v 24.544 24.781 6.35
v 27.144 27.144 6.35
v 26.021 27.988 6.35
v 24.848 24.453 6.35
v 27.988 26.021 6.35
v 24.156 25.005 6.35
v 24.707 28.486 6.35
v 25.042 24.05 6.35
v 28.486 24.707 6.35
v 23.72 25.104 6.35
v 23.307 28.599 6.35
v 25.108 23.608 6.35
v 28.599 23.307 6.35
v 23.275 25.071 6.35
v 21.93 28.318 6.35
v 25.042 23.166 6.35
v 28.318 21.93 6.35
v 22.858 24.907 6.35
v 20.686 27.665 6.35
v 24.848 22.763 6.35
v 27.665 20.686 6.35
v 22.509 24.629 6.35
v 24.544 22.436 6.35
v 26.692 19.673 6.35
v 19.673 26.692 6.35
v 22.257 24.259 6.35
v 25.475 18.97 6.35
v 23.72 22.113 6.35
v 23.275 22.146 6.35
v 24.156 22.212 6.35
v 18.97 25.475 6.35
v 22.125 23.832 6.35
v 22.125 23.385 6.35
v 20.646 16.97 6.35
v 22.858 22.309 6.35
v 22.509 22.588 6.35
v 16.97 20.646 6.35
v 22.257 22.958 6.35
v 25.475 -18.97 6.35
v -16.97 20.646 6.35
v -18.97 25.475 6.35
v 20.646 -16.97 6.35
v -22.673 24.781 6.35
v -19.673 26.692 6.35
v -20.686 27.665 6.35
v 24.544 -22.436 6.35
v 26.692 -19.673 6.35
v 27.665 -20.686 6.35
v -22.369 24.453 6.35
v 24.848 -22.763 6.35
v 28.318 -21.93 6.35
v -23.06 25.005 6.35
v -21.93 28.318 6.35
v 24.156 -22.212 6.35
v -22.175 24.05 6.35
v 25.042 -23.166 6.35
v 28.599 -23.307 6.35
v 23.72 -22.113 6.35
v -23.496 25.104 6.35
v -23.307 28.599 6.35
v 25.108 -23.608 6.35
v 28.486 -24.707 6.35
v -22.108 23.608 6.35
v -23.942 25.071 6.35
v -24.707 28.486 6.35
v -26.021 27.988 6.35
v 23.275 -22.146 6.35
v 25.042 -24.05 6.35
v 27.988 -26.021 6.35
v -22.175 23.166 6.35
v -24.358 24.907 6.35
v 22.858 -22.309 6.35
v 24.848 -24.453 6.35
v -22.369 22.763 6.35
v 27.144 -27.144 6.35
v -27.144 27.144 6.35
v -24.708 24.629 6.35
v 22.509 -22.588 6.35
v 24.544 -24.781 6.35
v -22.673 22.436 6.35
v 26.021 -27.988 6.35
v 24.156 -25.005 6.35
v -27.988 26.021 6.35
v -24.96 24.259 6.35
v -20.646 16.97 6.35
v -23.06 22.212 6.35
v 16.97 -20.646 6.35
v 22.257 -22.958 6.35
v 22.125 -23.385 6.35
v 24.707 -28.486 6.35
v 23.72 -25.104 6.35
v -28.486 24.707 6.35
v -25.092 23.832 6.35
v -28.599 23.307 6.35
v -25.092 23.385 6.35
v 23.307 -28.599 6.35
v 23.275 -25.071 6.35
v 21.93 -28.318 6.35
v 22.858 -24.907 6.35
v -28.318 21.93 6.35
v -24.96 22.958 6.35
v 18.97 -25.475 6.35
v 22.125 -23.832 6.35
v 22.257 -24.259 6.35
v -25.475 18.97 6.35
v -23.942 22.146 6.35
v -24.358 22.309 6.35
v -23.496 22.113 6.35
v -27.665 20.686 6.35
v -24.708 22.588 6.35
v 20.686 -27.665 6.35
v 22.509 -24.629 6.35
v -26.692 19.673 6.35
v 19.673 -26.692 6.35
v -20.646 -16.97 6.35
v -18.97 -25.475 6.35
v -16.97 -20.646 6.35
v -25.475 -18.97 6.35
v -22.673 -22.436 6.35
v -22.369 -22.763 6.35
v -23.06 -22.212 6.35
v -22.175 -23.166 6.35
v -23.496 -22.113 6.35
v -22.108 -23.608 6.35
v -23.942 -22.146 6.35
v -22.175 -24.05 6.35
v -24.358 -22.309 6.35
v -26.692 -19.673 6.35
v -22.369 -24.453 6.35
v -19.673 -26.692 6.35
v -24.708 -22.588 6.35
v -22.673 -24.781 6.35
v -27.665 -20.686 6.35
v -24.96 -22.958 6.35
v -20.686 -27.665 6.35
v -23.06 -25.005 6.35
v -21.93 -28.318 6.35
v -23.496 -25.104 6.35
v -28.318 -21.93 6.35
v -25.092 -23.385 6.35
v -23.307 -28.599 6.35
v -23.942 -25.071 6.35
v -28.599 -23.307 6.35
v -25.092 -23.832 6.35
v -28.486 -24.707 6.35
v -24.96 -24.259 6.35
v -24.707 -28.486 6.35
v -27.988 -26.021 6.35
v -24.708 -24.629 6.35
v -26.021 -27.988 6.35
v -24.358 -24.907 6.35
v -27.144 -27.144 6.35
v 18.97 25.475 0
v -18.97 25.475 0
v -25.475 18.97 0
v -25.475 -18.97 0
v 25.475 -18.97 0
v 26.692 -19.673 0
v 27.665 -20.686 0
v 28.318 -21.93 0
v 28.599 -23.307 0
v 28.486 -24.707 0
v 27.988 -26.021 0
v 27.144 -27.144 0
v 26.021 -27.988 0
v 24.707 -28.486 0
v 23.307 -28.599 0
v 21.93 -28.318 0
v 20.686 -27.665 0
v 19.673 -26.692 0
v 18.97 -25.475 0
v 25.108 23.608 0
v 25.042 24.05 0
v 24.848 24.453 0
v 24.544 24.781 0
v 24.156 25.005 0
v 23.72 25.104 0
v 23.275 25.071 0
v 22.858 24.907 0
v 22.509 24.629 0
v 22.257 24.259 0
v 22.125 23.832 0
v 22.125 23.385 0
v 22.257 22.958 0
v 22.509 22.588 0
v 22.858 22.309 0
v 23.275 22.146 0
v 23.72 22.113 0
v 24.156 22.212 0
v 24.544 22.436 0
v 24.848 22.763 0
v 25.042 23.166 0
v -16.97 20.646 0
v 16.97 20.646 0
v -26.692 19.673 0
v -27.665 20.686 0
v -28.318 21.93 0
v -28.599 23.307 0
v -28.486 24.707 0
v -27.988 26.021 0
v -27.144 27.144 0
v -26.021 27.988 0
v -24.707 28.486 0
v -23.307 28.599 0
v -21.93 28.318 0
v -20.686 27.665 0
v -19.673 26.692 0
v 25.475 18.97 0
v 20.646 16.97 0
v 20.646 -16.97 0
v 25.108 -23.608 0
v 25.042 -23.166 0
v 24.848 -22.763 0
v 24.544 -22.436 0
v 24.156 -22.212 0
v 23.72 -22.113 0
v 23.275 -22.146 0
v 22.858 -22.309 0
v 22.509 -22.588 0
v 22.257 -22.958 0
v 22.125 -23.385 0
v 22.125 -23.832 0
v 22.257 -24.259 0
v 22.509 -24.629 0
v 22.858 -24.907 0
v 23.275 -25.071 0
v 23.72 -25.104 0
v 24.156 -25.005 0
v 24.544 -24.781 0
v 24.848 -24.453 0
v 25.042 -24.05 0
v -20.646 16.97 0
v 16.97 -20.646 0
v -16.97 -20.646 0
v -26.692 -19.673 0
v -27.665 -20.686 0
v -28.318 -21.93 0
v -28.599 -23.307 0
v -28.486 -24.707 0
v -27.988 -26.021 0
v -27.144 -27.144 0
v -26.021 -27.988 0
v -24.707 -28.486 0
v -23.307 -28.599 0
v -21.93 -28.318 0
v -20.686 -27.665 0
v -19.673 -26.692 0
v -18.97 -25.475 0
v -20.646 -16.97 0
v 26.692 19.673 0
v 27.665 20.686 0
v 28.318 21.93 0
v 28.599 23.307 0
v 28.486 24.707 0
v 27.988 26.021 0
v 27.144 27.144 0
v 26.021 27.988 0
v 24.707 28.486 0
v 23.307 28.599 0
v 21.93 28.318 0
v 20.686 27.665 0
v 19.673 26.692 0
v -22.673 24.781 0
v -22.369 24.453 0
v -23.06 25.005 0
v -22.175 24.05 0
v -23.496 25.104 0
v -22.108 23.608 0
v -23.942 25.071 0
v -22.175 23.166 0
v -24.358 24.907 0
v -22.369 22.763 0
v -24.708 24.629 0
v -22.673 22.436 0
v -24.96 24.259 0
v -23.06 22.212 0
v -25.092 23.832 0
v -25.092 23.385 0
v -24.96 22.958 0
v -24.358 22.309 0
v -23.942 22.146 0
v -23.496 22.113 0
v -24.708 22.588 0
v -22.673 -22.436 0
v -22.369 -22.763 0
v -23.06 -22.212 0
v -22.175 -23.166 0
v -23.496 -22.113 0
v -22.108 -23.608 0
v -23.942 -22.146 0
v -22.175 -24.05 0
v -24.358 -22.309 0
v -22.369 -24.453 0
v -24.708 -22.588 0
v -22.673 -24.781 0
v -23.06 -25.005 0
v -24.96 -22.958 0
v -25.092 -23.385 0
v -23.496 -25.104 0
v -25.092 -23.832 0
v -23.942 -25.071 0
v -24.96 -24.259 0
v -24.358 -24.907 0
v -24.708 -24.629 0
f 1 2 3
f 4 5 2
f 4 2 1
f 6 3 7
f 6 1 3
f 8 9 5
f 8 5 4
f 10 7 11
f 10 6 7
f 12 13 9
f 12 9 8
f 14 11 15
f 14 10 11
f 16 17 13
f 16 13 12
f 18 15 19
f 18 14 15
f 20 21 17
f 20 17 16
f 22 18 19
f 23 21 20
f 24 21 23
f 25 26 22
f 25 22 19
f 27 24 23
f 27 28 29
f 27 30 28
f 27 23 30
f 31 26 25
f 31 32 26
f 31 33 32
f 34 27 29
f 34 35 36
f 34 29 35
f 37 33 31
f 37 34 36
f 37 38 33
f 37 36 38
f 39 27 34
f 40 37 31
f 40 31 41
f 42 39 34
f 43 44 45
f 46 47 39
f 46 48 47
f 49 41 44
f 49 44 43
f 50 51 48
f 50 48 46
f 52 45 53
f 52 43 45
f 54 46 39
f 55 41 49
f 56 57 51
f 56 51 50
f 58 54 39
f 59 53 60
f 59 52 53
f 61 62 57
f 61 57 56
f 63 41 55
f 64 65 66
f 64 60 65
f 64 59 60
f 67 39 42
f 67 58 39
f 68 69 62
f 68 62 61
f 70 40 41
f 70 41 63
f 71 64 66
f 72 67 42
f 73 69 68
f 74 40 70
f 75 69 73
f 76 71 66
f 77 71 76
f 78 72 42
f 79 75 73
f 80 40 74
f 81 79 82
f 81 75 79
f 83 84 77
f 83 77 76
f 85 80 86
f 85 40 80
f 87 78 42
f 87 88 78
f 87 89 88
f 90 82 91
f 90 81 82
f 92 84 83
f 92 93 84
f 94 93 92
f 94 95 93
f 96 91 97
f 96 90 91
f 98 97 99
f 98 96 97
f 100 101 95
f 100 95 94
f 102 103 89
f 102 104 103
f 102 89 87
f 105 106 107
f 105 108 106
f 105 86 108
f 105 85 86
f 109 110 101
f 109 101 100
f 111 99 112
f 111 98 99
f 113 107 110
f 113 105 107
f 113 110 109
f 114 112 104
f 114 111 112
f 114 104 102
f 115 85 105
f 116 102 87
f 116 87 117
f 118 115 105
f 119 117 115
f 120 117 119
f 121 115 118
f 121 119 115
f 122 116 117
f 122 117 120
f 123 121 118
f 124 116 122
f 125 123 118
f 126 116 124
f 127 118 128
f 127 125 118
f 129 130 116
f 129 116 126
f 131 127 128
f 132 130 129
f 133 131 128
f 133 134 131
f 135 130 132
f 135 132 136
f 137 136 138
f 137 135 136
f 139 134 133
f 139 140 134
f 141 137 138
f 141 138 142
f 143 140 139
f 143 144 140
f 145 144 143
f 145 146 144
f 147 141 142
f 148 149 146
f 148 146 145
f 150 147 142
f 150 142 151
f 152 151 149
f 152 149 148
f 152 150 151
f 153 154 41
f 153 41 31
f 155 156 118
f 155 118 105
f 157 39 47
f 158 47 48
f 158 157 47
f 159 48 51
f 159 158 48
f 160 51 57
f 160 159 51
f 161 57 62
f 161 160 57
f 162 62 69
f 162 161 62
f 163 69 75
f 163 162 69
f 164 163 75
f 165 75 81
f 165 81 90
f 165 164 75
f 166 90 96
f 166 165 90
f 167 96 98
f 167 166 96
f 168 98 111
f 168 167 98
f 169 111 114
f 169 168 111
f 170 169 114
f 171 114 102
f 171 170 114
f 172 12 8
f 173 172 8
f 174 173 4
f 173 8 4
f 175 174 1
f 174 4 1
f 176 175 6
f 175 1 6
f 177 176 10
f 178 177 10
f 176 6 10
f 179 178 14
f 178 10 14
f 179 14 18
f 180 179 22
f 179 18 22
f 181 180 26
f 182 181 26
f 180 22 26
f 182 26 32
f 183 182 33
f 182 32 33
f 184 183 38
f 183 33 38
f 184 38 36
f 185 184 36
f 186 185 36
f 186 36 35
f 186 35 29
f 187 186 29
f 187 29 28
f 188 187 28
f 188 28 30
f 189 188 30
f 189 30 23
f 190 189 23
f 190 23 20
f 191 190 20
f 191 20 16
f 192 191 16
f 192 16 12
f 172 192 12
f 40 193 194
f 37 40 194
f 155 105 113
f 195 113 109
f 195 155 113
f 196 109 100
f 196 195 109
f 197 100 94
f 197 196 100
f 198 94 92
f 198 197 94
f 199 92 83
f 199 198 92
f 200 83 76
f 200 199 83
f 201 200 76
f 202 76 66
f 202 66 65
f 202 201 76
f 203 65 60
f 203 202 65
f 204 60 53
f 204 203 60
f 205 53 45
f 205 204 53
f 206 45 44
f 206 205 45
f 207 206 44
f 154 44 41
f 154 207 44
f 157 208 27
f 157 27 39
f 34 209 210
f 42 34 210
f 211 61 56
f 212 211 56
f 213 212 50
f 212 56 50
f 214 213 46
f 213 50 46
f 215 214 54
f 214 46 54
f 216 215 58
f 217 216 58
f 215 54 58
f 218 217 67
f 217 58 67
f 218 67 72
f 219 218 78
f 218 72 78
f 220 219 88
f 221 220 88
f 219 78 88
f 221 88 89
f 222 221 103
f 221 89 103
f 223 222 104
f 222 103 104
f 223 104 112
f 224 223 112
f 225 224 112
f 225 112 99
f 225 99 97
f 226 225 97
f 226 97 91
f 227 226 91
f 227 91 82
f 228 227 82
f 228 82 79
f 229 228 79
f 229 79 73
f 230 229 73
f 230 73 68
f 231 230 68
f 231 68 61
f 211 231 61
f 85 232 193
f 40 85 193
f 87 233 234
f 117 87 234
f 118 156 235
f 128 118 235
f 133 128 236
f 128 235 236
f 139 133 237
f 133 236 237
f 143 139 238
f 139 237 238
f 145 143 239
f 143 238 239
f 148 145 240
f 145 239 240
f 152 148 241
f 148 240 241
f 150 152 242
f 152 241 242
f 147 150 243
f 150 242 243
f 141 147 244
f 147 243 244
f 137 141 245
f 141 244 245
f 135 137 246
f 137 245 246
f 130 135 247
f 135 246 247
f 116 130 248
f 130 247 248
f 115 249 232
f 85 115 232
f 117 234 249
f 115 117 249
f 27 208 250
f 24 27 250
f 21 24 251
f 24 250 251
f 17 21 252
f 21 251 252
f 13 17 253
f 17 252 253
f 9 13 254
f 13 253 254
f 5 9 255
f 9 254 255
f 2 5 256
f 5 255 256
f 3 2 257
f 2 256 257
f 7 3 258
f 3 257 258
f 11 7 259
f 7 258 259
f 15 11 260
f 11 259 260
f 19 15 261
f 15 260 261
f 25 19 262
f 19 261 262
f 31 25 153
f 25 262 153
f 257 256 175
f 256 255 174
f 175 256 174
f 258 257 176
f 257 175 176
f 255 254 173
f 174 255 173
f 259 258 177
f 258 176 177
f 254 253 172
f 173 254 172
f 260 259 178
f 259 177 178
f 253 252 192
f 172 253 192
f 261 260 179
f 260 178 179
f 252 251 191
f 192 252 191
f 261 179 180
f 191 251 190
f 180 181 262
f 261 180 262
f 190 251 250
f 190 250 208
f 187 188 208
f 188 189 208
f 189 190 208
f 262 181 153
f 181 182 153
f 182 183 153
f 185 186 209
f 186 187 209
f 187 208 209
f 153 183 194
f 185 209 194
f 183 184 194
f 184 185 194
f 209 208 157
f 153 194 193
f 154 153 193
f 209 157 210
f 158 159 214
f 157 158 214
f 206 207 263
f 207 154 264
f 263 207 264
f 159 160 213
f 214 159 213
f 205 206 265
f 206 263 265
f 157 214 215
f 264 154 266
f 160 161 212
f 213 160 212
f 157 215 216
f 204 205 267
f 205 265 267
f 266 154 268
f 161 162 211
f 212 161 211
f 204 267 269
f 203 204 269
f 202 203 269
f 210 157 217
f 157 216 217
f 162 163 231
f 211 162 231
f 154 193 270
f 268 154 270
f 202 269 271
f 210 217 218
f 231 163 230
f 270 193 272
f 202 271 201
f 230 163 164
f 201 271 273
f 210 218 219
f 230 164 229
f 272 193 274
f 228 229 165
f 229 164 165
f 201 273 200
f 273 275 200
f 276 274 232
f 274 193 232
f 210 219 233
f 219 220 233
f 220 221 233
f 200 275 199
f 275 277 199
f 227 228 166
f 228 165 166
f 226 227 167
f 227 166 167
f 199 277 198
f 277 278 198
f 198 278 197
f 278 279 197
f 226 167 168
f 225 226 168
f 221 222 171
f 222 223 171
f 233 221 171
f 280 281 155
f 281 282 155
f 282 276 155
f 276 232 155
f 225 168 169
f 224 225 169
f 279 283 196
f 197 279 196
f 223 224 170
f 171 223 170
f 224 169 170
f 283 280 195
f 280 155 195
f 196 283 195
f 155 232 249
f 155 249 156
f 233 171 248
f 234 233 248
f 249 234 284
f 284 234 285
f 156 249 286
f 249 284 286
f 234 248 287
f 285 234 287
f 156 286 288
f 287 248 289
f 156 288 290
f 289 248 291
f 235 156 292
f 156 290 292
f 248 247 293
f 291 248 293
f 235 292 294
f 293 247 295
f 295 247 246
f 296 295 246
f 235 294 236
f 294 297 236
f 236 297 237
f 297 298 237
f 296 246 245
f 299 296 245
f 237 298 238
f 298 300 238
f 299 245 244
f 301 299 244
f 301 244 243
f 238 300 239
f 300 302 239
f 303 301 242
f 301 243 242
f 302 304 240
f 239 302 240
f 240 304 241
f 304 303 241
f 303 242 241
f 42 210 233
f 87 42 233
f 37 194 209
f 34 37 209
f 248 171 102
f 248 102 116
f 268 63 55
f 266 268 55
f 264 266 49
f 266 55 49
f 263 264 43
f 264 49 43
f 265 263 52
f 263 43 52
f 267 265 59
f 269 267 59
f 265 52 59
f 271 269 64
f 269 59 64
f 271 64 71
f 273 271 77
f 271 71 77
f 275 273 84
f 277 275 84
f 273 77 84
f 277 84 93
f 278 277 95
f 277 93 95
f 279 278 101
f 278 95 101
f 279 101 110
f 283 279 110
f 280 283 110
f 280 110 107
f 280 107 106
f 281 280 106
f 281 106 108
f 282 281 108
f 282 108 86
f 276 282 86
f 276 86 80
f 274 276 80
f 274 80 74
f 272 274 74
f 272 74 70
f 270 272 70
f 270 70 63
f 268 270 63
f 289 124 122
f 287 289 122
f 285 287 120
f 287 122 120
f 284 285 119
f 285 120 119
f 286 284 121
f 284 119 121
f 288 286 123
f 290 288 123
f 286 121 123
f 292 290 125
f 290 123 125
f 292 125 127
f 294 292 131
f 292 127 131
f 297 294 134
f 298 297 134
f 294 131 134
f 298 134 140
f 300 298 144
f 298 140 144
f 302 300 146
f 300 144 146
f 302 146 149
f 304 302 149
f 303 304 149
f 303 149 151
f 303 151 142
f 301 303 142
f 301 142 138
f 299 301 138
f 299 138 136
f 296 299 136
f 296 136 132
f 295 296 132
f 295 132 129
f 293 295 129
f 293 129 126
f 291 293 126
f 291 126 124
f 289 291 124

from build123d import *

# Parameters (mm, degrees)
BOSS_EXTRU_2_DEPTH        = 6.35
ESQUISSE29_R              = 5
BOSS_EXTRU_3_DEPTH        = 6.35
SYM_TRIE2_COPY_1_SKETCH_R = 5
SYM_TRIE2_COPY_1_DEPTH    = 6.35
ESQUISSE30_R              = 1.5
ENL_V_MAT_EXTRU_1_DEPTH   = 41.953581056


with BuildPart() as part:
    # Esquisse28 → Boss.-Extru.2 (new body)
    with BuildSketch(Plane.XY):
        Polygon((-18.97, -25.475382387), (-25.475382387, -18.97), (-25.475382387, 18.97), (-18.97, 25.475382387), (18.97, 25.475382387), (25.475382387, 18.97), (25.475382387, -18.97), (18.97, -25.475382387), align=None)
        Polygon((-16.97, -20.645541049), (-20.645541049, -16.97), (-20.645541049, 16.97), (-16.97, 20.645541049), (16.97, 20.645541049), (20.645541049, 16.97), (20.645541049, -16.97), (16.97, -20.645541049), align=None, mode=Mode.SUBTRACT)
    extrude(amount=BOSS_EXTRU_2_DEPTH)

    # Esquisse29 → Boss.-Extru.3 (add)
    with BuildSketch(Plane.XY):
        with Locations((23.60833184, 23.60833184)):
            Circle(ESQUISSE29_R)
    boss_extru_3 = extrude(amount=BOSS_EXTRU_3_DEPTH)

    # Symétrie1: Boss.-Extru.3 across plane
    add(boss_extru_3.mirror(Plane(origin=(0, 0, 0), x_dir=(0, 0, 1), z_dir=(1, 0, 0))))

    # Symétrie2: Boss.-Extru.3 across plane
    add(boss_extru_3.mirror(Plane.ZX))

    # Symétrie2 copy 1 sketch → Symétrie2 copy 1 (add)
    with BuildSketch(Plane(origin=(0, 0, 0), x_dir=(-1, 0, 0), z_dir=(0, 0, 1))):
        with Locations((23.60833184, 23.60833184)):
            Circle(SYM_TRIE2_COPY_1_SKETCH_R)
    extrude(amount=SYM_TRIE2_COPY_1_DEPTH)

    # Esquisse30 → Enlèv. mat.-Extru.1 (cut, through all)
    with BuildSketch(Plane.XY.offset(6.35)):
        with Locations((-23.60833184, 23.60833184)):
            Circle(ESQUISSE30_R)
        with Locations((23.60833184, 23.60833184)):
            Circle(ESQUISSE30_R)
        with Locations((23.60833184, -23.60833184)):
            Circle(ESQUISSE30_R)
        with Locations((-23.60833184, -23.60833184)):
            Circle(ESQUISSE30_R)
    extrude(amount=-ENL_V_MAT_EXTRU_1_DEPTH, mode=Mode.SUBTRACT)


solid = part.part
